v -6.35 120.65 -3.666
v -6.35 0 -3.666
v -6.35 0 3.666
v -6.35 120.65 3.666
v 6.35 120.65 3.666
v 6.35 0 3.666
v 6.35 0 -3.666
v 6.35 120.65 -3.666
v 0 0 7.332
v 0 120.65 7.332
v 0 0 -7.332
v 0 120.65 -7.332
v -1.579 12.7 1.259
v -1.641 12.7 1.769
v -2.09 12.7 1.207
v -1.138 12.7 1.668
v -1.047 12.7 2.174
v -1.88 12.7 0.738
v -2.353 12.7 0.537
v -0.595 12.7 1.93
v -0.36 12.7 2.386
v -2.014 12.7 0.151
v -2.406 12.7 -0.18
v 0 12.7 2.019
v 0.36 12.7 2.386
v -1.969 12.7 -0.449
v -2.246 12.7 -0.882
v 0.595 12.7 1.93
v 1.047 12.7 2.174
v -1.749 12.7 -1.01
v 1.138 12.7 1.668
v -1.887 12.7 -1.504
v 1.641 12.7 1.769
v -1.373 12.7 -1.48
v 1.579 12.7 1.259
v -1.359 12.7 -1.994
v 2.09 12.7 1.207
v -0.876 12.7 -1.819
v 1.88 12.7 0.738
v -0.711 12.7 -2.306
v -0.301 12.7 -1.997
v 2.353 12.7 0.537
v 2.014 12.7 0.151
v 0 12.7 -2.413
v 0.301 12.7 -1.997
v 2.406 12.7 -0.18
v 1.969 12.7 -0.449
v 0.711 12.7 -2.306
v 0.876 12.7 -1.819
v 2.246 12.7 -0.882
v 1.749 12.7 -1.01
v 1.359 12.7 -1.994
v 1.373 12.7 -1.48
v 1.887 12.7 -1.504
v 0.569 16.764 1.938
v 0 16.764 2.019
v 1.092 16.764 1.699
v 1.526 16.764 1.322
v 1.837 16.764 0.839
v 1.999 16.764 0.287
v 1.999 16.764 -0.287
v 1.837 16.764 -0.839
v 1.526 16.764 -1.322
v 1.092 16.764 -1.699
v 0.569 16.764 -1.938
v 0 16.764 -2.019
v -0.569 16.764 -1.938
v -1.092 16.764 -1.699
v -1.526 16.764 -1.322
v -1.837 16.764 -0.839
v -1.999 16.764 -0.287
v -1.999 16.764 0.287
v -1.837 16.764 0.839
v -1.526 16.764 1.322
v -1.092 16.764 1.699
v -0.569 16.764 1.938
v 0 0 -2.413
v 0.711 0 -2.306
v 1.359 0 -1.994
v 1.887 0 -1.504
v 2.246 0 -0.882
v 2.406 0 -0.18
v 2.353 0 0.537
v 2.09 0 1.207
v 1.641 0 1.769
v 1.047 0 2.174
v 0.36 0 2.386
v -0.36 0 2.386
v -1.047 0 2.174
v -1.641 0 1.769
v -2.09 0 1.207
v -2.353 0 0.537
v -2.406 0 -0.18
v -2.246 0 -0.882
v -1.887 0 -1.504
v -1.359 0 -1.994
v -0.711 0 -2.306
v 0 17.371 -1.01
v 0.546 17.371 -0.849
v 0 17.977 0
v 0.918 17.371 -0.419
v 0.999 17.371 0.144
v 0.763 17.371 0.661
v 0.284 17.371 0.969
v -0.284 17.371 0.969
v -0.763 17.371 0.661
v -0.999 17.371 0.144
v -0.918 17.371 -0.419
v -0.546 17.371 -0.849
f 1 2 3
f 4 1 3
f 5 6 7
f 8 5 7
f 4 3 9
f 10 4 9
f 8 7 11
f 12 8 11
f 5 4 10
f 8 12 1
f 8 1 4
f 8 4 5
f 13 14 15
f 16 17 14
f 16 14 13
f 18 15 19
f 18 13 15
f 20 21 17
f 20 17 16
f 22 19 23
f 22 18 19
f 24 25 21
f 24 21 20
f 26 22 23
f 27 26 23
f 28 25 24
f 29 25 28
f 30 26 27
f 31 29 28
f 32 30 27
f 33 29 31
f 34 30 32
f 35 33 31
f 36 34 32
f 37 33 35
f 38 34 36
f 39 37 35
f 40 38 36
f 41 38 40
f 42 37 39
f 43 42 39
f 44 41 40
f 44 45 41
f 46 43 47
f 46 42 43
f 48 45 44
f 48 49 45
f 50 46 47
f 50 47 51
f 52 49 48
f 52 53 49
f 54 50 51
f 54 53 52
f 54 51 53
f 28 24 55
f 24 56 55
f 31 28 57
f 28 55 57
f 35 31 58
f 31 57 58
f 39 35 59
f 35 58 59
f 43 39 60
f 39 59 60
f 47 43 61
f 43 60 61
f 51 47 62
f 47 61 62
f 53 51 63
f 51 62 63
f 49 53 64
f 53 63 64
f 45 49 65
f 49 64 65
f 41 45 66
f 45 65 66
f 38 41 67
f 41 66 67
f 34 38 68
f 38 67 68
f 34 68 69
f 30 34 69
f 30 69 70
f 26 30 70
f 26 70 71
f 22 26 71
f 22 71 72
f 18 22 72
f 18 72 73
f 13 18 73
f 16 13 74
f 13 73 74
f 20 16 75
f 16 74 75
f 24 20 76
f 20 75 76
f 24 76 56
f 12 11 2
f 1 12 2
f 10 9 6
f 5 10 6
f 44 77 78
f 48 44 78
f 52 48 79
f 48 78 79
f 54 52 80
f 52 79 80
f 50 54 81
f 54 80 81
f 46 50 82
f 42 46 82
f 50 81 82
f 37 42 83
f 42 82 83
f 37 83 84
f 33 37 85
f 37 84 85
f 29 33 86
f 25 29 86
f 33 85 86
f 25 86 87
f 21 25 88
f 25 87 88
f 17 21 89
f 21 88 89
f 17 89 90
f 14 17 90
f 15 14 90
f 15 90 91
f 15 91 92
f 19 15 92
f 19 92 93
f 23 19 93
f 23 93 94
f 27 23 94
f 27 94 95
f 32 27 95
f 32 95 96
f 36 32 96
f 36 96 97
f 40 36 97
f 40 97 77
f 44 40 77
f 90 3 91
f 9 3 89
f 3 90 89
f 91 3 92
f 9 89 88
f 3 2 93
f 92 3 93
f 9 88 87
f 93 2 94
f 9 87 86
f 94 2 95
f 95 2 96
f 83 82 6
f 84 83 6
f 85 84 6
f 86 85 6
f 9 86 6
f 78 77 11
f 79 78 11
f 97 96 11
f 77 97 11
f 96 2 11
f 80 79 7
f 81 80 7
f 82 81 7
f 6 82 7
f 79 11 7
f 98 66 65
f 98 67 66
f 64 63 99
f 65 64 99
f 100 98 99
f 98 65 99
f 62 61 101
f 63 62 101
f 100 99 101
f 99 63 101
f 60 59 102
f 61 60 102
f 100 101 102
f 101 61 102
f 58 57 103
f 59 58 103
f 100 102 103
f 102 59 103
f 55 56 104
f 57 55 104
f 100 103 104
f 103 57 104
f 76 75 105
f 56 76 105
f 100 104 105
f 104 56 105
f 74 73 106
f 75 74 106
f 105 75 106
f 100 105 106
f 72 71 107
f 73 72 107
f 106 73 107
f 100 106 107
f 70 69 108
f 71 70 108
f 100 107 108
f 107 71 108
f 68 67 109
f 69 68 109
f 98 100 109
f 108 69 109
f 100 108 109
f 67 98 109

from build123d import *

# Parameters (mm, degrees)
BOSS_EXTRUDE1_DEPTH              = 120.65
F_10_32_TAPPED_HOLE1_D           = 4.0386
F_10_32_TAPPED_HOLE1_DEPTH       = 16.764
F_10_32_TAPPED_HOLE1_CBORE_D     = 4.826
F_10_32_TAPPED_HOLE1_CBORE_DEPTH = 12.7
F_10_32_TAPPED_HOLE1_TIP         = 1.213317848


with BuildPart() as part:
    # Sketch1 → Boss-Extrude1 (new body)
    with BuildSketch(Plane(origin=(0, 0, 0), x_dir=(1, 0, 0), z_dir=(0, 1, 0))):
        Polygon((0, 7.332348419), (-6.35, 3.666174209), (-6.35, -3.666174209), (0, -7.332348419), (6.35, -3.666174209), (6.35, 3.666174209), align=None)
    extrude(amount=BOSS_EXTRUDE1_DEPTH)

    # #10-32 Tapped Hole1
    with Locations(Plane(origin=(0, 0, 0), x_dir=(0, 0, -1), z_dir=(0, -1, 0))):
        with Locations((0, 0)):
            CounterBoreHole(F_10_32_TAPPED_HOLE1_D / 2, F_10_32_TAPPED_HOLE1_CBORE_D / 2, F_10_32_TAPPED_HOLE1_CBORE_DEPTH, depth=F_10_32_TAPPED_HOLE1_DEPTH)
            with Locations((0, 0, -(F_10_32_TAPPED_HOLE1_DEPTH + F_10_32_TAPPED_HOLE1_TIP / 2))):  # 118° drill point
                Cone(0, F_10_32_TAPPED_HOLE1_D / 2, F_10_32_TAPPED_HOLE1_TIP, mode=Mode.SUBTRACT)


solid = part.part
